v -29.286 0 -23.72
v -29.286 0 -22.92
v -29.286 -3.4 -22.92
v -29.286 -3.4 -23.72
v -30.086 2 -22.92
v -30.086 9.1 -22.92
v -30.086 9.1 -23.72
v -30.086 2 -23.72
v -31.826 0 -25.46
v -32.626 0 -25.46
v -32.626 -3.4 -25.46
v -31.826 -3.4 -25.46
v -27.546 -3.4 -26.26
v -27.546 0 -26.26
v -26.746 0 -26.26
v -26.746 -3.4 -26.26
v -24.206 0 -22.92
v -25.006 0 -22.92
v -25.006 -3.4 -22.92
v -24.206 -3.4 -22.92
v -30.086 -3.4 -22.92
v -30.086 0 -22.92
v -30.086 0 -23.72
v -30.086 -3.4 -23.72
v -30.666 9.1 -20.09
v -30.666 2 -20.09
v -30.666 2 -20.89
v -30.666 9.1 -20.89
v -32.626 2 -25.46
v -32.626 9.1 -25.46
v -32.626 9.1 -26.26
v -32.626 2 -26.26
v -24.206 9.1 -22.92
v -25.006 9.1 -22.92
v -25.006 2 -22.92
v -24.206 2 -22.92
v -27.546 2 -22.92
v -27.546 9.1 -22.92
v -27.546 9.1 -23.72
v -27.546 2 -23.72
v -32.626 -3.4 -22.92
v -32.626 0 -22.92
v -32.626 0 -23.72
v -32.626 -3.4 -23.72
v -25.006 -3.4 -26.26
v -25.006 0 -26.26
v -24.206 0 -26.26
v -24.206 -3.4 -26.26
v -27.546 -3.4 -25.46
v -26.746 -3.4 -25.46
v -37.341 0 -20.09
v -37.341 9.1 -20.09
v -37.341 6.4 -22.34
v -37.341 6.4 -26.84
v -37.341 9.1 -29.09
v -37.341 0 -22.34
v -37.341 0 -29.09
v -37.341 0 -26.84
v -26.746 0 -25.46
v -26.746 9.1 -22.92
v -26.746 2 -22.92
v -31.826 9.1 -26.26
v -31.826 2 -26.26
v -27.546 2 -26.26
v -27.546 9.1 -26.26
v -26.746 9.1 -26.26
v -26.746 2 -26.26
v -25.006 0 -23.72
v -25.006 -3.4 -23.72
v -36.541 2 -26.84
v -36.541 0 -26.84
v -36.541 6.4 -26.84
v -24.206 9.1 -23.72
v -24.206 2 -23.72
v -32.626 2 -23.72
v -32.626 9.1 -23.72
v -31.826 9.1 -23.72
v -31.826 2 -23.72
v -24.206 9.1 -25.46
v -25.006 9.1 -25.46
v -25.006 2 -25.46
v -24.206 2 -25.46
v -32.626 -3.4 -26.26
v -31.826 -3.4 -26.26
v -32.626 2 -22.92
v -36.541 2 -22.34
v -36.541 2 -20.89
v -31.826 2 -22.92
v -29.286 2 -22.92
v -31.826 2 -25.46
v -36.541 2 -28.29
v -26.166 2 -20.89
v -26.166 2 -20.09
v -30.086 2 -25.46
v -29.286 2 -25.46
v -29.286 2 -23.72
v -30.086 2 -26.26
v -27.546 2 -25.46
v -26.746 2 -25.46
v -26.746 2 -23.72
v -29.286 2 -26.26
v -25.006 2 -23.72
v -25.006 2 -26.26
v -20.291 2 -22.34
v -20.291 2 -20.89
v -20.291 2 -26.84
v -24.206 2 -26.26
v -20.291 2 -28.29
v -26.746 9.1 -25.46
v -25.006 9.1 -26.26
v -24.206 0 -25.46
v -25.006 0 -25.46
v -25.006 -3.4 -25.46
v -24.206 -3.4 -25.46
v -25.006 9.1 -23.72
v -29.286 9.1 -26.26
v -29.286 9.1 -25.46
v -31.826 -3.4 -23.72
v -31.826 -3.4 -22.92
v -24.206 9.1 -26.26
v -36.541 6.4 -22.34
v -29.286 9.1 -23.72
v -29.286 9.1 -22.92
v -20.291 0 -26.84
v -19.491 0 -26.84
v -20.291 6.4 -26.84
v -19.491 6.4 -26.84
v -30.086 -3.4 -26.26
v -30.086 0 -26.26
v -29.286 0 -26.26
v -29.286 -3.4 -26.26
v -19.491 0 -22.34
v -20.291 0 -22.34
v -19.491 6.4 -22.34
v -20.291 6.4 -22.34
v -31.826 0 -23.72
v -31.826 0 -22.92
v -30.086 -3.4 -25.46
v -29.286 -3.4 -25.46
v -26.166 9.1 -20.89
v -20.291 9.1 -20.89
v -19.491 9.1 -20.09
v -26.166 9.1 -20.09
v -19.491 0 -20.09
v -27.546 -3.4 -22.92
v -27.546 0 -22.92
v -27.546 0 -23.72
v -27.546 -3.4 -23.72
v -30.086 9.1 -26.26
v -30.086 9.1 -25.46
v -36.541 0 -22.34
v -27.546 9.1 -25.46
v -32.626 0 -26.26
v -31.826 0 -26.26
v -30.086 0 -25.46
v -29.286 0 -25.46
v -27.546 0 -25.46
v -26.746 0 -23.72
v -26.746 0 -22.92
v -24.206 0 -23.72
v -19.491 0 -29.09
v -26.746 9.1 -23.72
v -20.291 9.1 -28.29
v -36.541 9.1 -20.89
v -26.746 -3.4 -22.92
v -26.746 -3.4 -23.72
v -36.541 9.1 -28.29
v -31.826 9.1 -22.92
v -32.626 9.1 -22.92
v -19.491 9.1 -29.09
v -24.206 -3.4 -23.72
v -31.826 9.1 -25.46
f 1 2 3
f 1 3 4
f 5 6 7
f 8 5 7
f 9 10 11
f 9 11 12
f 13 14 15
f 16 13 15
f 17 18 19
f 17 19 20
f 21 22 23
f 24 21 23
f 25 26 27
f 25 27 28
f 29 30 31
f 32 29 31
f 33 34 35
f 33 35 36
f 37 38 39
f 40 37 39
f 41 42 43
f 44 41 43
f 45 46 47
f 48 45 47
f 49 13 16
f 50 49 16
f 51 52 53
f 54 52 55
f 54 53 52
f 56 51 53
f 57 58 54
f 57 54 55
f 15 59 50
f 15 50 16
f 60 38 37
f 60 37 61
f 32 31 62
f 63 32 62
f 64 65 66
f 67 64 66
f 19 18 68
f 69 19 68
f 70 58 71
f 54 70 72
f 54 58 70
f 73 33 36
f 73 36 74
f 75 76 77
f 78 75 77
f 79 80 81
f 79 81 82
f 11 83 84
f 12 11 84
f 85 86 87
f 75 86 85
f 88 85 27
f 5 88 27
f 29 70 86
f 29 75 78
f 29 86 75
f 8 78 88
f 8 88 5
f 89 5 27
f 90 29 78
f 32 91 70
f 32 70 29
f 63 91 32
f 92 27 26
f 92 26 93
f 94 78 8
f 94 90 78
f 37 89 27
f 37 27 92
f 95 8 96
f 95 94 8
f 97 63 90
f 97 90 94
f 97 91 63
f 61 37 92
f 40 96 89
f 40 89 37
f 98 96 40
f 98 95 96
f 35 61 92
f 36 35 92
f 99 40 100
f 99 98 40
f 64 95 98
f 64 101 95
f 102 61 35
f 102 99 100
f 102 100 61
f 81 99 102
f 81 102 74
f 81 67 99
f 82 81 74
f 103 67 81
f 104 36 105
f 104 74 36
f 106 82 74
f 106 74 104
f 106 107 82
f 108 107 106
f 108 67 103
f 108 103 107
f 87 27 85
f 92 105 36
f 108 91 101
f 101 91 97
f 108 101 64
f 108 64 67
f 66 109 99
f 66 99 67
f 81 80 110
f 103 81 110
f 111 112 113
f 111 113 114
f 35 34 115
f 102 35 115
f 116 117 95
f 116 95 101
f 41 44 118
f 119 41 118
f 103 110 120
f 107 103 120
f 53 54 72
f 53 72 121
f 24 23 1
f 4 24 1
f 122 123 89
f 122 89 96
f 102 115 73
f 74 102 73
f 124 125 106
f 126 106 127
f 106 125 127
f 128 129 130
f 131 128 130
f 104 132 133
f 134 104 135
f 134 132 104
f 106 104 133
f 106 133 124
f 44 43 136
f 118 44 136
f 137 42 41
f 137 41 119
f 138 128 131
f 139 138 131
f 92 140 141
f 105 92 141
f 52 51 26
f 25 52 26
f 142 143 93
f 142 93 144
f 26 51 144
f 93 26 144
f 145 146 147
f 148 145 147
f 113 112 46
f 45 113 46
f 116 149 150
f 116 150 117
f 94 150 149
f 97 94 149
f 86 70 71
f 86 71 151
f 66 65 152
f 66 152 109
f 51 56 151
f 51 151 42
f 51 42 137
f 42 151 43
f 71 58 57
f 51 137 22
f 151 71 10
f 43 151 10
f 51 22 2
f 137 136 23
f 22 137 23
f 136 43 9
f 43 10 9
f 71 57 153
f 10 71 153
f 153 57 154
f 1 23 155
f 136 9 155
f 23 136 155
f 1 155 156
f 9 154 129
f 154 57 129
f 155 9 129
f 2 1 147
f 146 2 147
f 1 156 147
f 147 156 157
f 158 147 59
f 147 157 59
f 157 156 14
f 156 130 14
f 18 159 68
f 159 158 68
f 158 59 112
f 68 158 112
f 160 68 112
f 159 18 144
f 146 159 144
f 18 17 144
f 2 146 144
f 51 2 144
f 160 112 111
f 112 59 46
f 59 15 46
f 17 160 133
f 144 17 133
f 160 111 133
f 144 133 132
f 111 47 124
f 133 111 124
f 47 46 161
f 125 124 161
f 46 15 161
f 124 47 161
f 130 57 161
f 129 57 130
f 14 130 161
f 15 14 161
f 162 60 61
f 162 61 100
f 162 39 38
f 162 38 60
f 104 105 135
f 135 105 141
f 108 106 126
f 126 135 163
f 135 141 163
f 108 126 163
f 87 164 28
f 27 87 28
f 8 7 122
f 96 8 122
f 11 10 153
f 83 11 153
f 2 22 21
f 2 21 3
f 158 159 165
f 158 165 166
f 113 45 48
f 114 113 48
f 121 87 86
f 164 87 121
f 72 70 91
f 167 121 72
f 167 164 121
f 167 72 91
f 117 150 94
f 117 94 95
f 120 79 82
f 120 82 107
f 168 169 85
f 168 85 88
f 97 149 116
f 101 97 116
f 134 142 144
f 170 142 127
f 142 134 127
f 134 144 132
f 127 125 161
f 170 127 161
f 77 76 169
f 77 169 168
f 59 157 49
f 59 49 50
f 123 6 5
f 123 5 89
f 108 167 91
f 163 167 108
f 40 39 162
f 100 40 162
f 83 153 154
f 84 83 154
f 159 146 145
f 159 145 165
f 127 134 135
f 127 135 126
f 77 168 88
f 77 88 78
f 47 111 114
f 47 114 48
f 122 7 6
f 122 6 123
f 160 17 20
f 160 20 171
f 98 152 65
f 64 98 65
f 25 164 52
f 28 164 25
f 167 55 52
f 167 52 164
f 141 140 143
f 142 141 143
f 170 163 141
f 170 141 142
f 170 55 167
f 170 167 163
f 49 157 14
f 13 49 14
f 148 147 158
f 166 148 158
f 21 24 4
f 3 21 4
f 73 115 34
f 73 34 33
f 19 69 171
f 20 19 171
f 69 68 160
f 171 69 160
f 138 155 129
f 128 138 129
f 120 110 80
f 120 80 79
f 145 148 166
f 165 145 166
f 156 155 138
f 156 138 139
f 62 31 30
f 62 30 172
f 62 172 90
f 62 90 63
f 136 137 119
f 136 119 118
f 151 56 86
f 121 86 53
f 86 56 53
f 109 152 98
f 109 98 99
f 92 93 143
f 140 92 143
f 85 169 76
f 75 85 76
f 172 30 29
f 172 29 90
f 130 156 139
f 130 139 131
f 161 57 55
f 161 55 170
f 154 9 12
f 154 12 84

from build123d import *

# Parameters (mm, degrees)
SKETCH1_W           = 17.85
SKETCH1_H           = 9
BOSS_EXTRUDE1_DEPTH = 9.1
SKETCH2_W           = 16.25
SKETCH2_H           = 7.4
CUT_EXTRUDE1_DEPTH  = 7.1
SKETCH2_3_W         = 0.8
SKETCH2_3_H         = 0.8
BOSS_EXTRUDE2_DEPTH = 12.5
SKETCH3_W           = 4.5
SKETCH3_H           = 7.1
CUT_EXTRUDE2_DEPTH  = 2.1
SKETCH5_W           = 4.5
SKETCH5_H           = 6.4
CUT_EXTRUDE3_DEPTH  = 0.8
SKETCH6_W           = 4.5
SKETCH6_H           = 6.4
CUT_EXTRUDE4_DEPTH  = 0.8


with BuildPart() as part:
    # Sketch1 → Boss-Extrude1 (new body)
    with BuildSketch(Plane(origin=(0, 0, 0), x_dir=(1, 0, 0), z_dir=(0, 1, 0))):
        with Locations((-28.415572658, 24.590099186)):
            Rectangle(SKETCH1_W, SKETCH1_H)
    extrude(amount=BOSS_EXTRUDE1_DEPTH)

    # Sketch2 → Cut-Extrude1 (cut)
    with BuildSketch(Plane(origin=(0, 9.1, 0), x_dir=(1, 0, 0), z_dir=(0, 1, 0))):
        with Locations((-28.415572658, 24.590099186)):
            Rectangle(SKETCH2_W, SKETCH2_H)
    extrude(amount=-CUT_EXTRUDE1_DEPTH, mode=Mode.SUBTRACT)

    # Sketch2<3> → Boss-Extrude2 (add)
    with BuildSketch(Plane(origin=(0, 9.1, 0), x_dir=(1, 0, 0), z_dir=(0, 1, 0))):
        with Locations((-29.685572658, 23.320099186)):
            Rectangle(SKETCH2_3_W, SKETCH2_3_H)
        with Locations((-27.145572658, 23.320099186)):
            Rectangle(SKETCH2_3_W, SKETCH2_3_H)
        with Locations((-24.605572658, 23.320099186)):
            Rectangle(SKETCH2_3_W, SKETCH2_3_H)
        with Locations((-27.145572658, 25.860099186)):
            Rectangle(SKETCH2_3_W, SKETCH2_3_H)
        with Locations((-24.605572658, 25.860099186)):
            Rectangle(SKETCH2_3_W, SKETCH2_3_H)
        with Locations((-29.685572658, 25.860099186)):
            Rectangle(SKETCH2_3_W, SKETCH2_3_H)
        with Locations((-32.225572658, 23.320099186)):
            Rectangle(SKETCH2_3_W, SKETCH2_3_H)
        with Locations((-32.225572658, 25.860099186)):
            Rectangle(SKETCH2_3_W, SKETCH2_3_H)
    extrude(amount=-BOSS_EXTRUDE2_DEPTH)

    # Sketch3 → Cut-Extrude2 (cut)
    with BuildSketch(Plane.XY.offset(-20.090099186)):
        with Locations((-28.415572658, 5.55)):
            Rectangle(SKETCH3_W, SKETCH3_H)
    extrude(amount=-CUT_EXTRUDE2_DEPTH, mode=Mode.SUBTRACT)

    # Sketch5 → Cut-Extrude3 (cut)
    with BuildSketch(Plane.ZY.offset(37.340572658)):
        with Locations((-24.590099186, 3.2)):
            Rectangle(SKETCH5_W, SKETCH5_H)
    extrude(amount=-CUT_EXTRUDE3_DEPTH, mode=Mode.SUBTRACT)

    # Sketch6 → Cut-Extrude4 (cut)
    with BuildSketch(Plane(origin=(-19.490572658, 0, 0), x_dir=(0, 0, -1), z_dir=(1, 0, 0))):
        with Locations((24.590099186, 3.2)):
            Rectangle(SKETCH6_W, SKETCH6_H)
    extrude(amount=-CUT_EXTRUDE4_DEPTH, mode=Mode.SUBTRACT)


solid = part.part
